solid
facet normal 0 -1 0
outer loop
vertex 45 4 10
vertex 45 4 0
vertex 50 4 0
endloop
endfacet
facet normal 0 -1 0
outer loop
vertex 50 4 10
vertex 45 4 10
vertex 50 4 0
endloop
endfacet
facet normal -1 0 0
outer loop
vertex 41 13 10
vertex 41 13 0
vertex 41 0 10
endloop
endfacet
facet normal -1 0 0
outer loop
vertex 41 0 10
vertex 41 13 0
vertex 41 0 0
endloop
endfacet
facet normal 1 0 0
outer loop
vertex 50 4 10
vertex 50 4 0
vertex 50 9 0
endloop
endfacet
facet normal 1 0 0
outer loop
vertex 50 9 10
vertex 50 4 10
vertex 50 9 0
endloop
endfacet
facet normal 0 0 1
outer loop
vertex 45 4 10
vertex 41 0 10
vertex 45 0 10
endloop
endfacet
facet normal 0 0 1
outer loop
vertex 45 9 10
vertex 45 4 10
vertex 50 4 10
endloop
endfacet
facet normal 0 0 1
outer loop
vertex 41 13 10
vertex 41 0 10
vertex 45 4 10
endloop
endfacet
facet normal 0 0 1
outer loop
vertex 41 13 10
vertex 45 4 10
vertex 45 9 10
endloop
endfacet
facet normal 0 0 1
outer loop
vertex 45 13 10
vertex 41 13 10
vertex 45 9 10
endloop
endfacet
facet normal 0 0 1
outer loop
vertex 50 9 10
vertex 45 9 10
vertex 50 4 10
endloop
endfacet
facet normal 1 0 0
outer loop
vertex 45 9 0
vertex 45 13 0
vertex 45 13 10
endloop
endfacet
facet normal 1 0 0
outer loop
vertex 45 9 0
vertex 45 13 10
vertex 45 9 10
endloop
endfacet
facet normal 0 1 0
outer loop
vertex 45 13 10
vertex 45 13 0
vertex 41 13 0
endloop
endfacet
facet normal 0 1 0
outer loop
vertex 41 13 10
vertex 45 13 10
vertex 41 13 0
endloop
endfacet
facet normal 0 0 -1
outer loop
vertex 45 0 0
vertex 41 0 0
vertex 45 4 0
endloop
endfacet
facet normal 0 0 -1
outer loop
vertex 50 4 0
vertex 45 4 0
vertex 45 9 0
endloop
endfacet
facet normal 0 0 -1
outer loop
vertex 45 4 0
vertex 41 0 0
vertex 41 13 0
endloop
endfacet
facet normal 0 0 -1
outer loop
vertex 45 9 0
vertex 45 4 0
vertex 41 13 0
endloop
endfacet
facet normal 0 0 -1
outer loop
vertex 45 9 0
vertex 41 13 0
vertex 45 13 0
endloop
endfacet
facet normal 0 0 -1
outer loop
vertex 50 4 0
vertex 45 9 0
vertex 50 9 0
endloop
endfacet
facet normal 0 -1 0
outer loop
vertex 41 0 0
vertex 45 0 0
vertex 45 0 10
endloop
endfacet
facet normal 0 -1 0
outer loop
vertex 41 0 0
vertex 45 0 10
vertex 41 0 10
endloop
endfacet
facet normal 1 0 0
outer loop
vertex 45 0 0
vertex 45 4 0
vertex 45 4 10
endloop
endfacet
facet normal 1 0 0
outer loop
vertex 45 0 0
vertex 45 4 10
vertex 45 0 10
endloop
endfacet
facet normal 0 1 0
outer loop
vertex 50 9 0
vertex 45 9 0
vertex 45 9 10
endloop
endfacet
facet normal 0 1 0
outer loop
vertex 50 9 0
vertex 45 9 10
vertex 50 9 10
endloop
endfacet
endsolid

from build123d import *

# Parameters (mm, degrees)
BOX028_W               = 1
BOX028_H               = 5
BOX028_DEPTH           = 10
BOX027_W               = 13
BOX027_H               = 15
BOX027_DEPTH           = 10
BOX026_W               = 4
BOX026_H               = 4
BOX026_DEPTH           = 17
BOX025_W               = 4
BOX025_H               = 4
BOX025_DEPTH           = 17
BOX024_W               = 8
BOX024_H               = 13
BOX024_DEPTH           = 13
CUT025_PLACEMENT_ANGLE = 180


with BuildPart() as cubo028:
    # Box028 → Box028 (new body)
    with BuildSketch(Plane(origin=(49, 4, 0), x_dir=(1, 0, 0), z_dir=(0, 0, 1))):
        with Locations((0.5, 2.5)):
            Rectangle(BOX028_W, BOX028_H)
    extrude(amount=BOX028_DEPTH)


with BuildPart() as cubo027:
    # Box027 → Box027 (new body)
    with BuildSketch(Plane(origin=(38, -1, 10), x_dir=(1, 0, 0), z_dir=(0, 0, 1))):
        with Locations((6.5, 7.5)):
            Rectangle(BOX027_W, BOX027_H)
    extrude(amount=BOX027_DEPTH)


with BuildPart() as cubo026:
    # Box026 → Box026 (new body)
    with BuildSketch(Plane(origin=(0, 9, 0), x_dir=(1, 0, 0), z_dir=(0, 0, 1))):
        with Locations((2, 2)):
            Rectangle(BOX026_W, BOX026_H)
    extrude(amount=BOX026_DEPTH)


with BuildPart() as cubo025:
    # Box025 → Box025 (new body)
    with BuildSketch(Plane.XY):
        with Locations((2, 2)):
            Rectangle(BOX025_W, BOX025_H)
    extrude(amount=BOX025_DEPTH)


with BuildPart() as tope:
    # Box024 → Box024 (new body)
    with BuildSketch(Plane.XY):
        with Locations((4, 6.5)):
            Rectangle(BOX024_W, BOX024_H)
    extrude(amount=BOX024_DEPTH)

    # Cut024: cut Cubo025
    add(cubo025.part, mode=Mode.SUBTRACT)

    # Cut025: cut Cubo026
    add(cubo026.part, mode=Mode.SUBTRACT)


with BuildPart() as tope_1:
    # Cut025 placement: moved
    add(tope.part.moved(Location((50, 13, 0))).rotate(Axis((50, 13, 0), (0, 0, 1)), CUT025_PLACEMENT_ANGLE))

    # Cut026: cut Cubo027
    add(cubo027.part, mode=Mode.SUBTRACT)


with BuildPart() as tope_2:
    # Cut026 placement: moved
    add(tope_1.part.moved(Location((-1, 0, 0))))

    # Fusion014: union Cubo028
    add(cubo028.part)


solid = tope_2.part
